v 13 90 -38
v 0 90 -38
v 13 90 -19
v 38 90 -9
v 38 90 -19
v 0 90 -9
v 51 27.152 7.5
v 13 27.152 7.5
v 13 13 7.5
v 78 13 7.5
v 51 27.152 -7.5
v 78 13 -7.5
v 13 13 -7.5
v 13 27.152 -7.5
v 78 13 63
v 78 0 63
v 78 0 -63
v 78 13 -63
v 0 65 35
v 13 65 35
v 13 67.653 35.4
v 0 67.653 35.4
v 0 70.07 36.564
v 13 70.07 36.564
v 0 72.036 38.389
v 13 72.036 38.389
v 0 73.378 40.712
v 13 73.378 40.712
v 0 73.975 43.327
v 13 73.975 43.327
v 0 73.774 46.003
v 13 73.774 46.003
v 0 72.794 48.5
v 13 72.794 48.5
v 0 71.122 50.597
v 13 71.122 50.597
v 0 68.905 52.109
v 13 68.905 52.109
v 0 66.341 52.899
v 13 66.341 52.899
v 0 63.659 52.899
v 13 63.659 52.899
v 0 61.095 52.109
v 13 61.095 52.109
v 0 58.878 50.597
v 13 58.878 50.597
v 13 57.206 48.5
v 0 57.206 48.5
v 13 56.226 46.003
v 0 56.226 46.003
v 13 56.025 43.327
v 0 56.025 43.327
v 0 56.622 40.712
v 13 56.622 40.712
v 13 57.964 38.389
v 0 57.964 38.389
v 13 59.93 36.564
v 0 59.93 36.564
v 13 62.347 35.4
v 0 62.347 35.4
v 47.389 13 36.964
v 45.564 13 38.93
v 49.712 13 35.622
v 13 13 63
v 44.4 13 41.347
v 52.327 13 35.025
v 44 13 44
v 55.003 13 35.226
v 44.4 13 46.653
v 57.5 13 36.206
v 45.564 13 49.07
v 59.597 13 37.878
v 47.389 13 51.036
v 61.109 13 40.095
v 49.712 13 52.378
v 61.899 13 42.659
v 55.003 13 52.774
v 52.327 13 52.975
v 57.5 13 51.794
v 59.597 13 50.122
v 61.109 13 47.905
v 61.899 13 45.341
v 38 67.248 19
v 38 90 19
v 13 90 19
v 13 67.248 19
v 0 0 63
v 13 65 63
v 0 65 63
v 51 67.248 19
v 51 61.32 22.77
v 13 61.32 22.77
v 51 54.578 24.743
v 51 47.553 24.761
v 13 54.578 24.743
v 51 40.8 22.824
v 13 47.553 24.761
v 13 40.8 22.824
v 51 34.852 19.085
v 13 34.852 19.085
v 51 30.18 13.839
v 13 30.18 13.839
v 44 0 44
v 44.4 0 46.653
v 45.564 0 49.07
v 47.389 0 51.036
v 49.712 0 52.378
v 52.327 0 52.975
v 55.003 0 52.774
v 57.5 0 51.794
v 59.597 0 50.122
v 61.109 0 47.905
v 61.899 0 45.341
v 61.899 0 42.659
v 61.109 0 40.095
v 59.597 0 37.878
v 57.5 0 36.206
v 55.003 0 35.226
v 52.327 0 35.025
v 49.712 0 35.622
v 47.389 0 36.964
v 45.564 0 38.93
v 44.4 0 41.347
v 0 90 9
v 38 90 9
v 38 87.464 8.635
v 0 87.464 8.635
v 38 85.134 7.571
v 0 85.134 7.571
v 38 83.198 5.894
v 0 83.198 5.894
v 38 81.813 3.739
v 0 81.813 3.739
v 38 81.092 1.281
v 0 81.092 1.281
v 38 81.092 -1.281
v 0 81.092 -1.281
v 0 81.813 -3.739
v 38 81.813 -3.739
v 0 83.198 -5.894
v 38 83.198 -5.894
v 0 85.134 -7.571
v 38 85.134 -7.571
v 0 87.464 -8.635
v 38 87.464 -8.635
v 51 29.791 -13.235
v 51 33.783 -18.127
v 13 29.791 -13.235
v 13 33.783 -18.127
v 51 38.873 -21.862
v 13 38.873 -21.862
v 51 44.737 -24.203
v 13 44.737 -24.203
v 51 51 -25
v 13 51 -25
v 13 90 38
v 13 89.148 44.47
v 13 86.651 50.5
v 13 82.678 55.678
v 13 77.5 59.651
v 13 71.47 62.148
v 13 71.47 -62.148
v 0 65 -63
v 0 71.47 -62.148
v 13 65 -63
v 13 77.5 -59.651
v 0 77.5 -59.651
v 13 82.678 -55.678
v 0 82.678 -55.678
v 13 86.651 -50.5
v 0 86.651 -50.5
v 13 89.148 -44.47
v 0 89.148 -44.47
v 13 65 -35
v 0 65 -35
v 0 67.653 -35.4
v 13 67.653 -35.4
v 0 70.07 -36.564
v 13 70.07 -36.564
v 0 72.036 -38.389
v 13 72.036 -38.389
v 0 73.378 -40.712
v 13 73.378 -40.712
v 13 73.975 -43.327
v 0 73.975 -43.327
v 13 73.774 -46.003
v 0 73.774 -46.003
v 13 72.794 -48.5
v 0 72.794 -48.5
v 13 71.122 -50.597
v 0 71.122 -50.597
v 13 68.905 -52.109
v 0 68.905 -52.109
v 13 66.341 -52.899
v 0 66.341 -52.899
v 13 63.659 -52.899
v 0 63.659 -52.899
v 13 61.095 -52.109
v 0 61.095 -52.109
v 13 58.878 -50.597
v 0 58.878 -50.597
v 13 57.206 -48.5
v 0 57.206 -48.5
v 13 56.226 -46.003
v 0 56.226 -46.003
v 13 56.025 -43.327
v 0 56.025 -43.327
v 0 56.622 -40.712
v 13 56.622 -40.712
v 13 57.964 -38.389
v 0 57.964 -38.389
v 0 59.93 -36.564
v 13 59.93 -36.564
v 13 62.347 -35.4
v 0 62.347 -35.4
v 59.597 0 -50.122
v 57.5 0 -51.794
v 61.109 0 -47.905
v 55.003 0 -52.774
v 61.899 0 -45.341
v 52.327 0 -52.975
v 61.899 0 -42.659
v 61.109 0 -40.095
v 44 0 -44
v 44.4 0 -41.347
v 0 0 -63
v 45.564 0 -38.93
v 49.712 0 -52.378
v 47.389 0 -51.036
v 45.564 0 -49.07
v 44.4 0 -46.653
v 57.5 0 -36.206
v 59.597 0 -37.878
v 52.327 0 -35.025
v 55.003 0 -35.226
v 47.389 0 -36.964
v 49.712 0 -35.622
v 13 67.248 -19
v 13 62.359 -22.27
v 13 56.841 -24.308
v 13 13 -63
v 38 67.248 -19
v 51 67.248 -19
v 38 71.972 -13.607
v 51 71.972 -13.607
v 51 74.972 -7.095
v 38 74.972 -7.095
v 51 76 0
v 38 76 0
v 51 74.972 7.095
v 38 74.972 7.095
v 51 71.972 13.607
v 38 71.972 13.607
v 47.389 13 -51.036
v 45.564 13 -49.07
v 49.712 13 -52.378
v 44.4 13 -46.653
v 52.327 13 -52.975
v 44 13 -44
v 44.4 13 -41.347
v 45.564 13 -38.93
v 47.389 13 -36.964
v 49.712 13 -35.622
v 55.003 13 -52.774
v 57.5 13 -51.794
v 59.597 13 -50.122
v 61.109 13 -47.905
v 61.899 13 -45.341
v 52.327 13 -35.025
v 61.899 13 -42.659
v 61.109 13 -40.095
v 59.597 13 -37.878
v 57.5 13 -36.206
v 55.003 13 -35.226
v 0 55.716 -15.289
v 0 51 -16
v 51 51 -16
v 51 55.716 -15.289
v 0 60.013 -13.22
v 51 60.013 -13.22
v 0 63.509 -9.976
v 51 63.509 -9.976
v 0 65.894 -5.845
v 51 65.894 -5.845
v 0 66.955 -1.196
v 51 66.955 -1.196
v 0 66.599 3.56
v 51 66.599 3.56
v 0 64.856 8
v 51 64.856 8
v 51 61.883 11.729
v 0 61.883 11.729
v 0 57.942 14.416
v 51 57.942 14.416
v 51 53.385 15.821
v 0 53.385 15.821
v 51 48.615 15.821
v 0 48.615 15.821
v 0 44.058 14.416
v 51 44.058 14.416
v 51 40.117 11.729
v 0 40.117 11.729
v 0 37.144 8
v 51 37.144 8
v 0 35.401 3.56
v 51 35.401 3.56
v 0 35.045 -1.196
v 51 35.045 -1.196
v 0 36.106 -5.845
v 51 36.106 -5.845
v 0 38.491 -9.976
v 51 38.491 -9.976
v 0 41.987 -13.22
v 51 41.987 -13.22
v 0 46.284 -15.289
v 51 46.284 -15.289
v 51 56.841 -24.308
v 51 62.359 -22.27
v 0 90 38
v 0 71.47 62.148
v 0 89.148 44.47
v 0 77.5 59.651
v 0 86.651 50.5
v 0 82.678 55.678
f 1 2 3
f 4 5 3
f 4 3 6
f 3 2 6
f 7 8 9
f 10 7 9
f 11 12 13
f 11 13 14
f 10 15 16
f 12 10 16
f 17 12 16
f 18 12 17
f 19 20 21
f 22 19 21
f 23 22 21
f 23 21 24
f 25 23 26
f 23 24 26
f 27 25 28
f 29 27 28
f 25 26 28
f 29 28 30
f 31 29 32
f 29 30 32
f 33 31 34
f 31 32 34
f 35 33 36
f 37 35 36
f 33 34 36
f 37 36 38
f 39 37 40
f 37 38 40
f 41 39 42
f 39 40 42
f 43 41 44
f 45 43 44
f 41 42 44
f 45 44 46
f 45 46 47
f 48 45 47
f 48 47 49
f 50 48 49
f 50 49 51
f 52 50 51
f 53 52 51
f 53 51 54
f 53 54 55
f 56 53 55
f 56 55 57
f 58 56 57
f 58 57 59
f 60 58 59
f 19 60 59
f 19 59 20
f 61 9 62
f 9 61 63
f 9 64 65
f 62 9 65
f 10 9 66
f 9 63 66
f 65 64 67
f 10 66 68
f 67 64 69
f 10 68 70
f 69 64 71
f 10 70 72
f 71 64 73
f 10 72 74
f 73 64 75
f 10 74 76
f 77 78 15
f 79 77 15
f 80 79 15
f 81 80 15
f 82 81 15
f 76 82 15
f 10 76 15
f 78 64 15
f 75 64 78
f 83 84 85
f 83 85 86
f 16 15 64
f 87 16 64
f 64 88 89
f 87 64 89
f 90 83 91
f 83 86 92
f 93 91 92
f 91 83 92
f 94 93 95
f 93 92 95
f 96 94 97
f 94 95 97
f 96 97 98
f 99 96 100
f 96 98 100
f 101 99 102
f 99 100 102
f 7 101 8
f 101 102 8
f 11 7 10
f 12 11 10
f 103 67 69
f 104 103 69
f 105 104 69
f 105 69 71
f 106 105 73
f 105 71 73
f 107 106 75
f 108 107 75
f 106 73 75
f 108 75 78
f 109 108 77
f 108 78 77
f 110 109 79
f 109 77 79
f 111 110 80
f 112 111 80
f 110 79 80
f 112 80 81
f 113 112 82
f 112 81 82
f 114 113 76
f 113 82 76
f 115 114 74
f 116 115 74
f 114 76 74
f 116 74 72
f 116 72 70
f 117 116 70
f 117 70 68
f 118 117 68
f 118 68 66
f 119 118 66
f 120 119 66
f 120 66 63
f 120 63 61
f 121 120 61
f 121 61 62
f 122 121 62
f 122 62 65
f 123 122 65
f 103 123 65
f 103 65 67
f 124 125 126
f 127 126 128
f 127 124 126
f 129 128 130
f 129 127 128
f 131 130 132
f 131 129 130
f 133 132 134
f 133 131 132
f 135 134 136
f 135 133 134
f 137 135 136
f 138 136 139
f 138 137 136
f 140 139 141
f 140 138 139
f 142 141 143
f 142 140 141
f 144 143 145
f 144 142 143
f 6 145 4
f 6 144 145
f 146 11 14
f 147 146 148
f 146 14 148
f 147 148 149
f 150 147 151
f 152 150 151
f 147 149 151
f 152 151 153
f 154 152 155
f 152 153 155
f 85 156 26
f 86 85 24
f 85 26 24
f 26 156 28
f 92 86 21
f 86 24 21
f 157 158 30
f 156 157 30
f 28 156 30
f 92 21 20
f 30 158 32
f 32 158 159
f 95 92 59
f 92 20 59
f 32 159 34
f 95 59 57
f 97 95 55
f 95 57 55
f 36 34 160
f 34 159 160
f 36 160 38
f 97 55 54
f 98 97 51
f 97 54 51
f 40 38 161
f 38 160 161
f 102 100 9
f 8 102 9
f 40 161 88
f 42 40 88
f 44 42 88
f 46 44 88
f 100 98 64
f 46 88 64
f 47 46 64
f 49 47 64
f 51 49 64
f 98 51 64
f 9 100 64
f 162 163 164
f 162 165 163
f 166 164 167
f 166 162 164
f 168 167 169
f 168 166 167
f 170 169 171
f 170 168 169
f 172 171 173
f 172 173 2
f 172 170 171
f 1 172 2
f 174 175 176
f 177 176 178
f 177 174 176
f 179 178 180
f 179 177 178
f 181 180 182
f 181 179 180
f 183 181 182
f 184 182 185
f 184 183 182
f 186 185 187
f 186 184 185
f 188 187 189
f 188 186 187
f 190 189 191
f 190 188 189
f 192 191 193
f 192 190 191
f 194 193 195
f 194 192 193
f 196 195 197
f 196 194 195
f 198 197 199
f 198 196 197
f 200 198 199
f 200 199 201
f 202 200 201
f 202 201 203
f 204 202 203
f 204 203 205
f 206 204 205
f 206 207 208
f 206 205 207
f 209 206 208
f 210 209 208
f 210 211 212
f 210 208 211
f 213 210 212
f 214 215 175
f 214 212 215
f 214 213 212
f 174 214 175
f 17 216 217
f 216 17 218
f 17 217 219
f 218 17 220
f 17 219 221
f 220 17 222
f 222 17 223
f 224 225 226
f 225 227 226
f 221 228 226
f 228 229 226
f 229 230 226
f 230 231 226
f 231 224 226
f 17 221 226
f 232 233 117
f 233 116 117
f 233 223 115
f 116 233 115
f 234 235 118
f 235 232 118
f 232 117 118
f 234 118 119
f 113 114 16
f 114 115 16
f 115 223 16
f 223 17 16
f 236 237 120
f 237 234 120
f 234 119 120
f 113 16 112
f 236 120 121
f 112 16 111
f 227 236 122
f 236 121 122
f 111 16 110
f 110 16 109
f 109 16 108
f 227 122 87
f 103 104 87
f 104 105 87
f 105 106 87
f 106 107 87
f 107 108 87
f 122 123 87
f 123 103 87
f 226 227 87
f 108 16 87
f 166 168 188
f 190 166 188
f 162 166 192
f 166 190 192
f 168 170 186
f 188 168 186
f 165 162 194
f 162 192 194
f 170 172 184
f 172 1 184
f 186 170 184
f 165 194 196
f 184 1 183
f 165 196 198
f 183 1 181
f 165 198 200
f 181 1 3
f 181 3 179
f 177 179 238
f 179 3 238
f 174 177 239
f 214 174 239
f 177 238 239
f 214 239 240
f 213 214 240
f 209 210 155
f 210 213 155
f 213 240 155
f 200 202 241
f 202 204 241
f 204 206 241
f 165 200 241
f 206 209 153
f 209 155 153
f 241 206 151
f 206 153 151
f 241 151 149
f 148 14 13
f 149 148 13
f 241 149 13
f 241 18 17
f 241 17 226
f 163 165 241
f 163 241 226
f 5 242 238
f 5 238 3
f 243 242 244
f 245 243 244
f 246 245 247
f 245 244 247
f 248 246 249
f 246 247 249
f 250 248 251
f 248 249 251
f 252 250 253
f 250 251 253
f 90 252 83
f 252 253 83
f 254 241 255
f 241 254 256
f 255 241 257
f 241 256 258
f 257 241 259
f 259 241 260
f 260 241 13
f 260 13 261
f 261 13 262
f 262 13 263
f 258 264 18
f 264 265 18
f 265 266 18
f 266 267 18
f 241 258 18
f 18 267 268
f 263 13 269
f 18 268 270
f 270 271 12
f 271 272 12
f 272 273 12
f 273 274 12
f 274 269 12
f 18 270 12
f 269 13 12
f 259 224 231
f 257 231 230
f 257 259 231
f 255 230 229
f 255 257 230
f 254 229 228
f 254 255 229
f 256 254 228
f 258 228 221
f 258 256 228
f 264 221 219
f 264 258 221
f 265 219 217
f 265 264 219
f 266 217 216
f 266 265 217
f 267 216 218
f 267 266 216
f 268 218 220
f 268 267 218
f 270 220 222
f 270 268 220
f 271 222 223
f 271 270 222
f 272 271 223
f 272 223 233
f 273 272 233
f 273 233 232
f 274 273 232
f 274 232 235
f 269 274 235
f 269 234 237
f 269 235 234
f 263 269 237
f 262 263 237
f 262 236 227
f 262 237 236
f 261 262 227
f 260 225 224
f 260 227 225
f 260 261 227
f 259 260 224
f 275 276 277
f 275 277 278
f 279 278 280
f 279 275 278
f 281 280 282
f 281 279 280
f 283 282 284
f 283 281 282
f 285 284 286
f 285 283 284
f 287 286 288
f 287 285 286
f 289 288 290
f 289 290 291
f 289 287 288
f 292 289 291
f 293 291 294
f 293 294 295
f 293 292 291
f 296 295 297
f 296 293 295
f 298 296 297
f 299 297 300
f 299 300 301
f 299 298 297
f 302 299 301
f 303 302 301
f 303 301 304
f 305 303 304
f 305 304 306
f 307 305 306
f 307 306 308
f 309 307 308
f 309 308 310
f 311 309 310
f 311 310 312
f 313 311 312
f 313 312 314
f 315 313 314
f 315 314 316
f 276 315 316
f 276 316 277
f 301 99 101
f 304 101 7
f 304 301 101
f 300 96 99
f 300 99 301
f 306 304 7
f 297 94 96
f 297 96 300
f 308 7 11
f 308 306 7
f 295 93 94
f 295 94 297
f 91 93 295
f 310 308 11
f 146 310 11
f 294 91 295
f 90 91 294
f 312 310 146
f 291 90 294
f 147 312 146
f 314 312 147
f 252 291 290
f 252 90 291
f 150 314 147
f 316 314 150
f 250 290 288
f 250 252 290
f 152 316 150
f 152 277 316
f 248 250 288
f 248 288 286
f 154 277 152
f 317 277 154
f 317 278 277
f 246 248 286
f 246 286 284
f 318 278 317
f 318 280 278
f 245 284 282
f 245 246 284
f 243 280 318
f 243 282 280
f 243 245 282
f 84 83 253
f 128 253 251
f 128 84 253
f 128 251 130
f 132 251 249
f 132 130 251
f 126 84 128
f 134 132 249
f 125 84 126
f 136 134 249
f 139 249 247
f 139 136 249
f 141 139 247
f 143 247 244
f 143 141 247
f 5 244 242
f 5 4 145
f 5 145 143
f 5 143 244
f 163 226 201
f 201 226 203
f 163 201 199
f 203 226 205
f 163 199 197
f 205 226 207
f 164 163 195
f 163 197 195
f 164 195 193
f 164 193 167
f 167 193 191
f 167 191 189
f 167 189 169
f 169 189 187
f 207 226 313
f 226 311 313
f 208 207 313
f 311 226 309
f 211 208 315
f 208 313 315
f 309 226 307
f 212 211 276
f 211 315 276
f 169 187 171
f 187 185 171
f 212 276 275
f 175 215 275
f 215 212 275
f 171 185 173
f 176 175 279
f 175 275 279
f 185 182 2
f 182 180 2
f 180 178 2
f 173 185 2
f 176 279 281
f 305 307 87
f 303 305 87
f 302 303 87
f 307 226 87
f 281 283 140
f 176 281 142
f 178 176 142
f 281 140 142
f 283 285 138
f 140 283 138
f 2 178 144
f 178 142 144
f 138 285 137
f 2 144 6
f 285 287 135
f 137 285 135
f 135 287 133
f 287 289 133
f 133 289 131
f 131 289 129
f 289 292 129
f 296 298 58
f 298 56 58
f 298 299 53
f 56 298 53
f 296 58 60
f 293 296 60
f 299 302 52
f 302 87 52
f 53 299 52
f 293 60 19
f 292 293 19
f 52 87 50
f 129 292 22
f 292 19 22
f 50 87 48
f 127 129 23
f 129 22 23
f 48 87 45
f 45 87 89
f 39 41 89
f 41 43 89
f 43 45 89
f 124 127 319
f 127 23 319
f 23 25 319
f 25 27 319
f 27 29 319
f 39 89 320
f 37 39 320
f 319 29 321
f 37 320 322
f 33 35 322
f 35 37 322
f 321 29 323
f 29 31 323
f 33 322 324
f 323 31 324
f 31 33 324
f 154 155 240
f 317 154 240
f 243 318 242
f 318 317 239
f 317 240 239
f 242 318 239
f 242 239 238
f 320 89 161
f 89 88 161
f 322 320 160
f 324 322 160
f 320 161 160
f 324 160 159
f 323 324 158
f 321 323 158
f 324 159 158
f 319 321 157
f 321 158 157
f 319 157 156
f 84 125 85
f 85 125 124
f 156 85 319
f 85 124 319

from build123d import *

# Parameters (mm, degrees)
BOSS_EXTRUDE1_DEPTH = 63
SKETCH2_R           = 16
BOSS_EXTRUDE2_DEPTH = 38
BOSS_EXTRUDE3_DEPTH = 25
CUT_EXTRUDE1_START  = -38
CUT_EXTRUDE1_DEPTH  = 38
CUT_EXTRUDE2_START  = -38
SKETCH2_5_R         = 16
CUT_EXTRUDE2_DEPTH  = 38
BOSS_EXTRUDE4_DEPTH = 65
SKETCH5_R           = 9
CUT_EXTRUDE4_DEPTH  = 38
SKETCH6_R           = 9
CUT_EXTRUDE5_DEPTH  = 38
FILLET1_R           = 25
CUT_EXTRUDE6_DEPTH  = 38


with BuildPart() as part:
    # Sketch1 → Boss-Extrude1 (new, symmetric)
    with BuildSketch(Plane.XY):
        Polygon((0, 0), (0, 90), (13, 90), (13, 13), (78, 13), (78, 0), align=None)
    extrude(amount=BOSS_EXTRUDE1_DEPTH, both=True)

    # Sketch2 → Boss-Extrude2 (add)
    with BuildSketch(Plane(origin=(13, 0, 0), x_dir=(0, 0, -1), z_dir=(1, 0, 0))):
        with BuildLine():
            ThreePointArc((19, 67.248076809), (0, 76), (-19, 67.248076809))
            ThreePointArc((-19, 67.248076809), (-24.031145784, 44.107683096), (-7.5, 27.151519965))
            Line((-7.5, 27.151519965), (7.5, 27.151519965))
            ThreePointArc((7.5, 27.151519965), (20.155644371, 36.209800542), (25, 51))
            ThreePointArc((25, 51), (23.452078799, 59.660254038), (19, 67.248076809))
        make_face()
        with Locations((0, 51)):
            Circle(SKETCH2_R, mode=Mode.SUBTRACT)
    extrude(amount=BOSS_EXTRUDE2_DEPTH)

    # Sketch2<3> → Boss-Extrude3 (add)
    with BuildSketch(Plane(origin=(13, 0, 0), x_dir=(0, 0, -1), z_dir=(1, 0, 0))):
        with BuildLine():
            Line((-9, 90), (-19, 90))
            Line((-19, 90), (-19, 67.248076809))
            ThreePointArc((-19, 67.248076809), (0, 76), (19, 67.248076809))
            Line((19, 67.248076809), (19, 90))
            Line((19, 90), (9, 90))
            ThreePointArc((9, 90), (0, 81), (-9, 90))
        make_face()
    extrude(amount=BOSS_EXTRUDE3_DEPTH)

    # Sketch2<4> → Cut-Extrude1 (cut)
    with BuildSketch(Plane(origin=(13, 0, 0), x_dir=(0, 0, -1), z_dir=(1, 0, 0)).offset(CUT_EXTRUDE1_START)):
        with BuildLine():
            Line((9, 90), (-9, 90))
            ThreePointArc((-9, 90), (0, 81), (9, 90))
        make_face()
    extrude(amount=CUT_EXTRUDE1_DEPTH, mode=Mode.SUBTRACT)

    # Sketch2<5> → Cut-Extrude2 (cut)
    with BuildSketch(Plane(origin=(13, 0, 0), x_dir=(0, 0, -1), z_dir=(1, 0, 0)).offset(CUT_EXTRUDE2_START)):
        with Locations((0, 51)):
            Circle(SKETCH2_5_R)
    extrude(amount=CUT_EXTRUDE2_DEPTH, mode=Mode.SUBTRACT)

    # Sketch2<6> → Boss-Extrude4 (add)
    with BuildSketch(Plane(origin=(13, 0, 0), x_dir=(0, 0, -1), z_dir=(1, 0, 0))):
        with BuildLine():
            ThreePointArc((7.5, 27.151519965), (0, 26), (-7.5, 27.151519965))
            Line((-7.5, 27.151519965), (-7.5, 13))
            Line((-7.5, 13), (7.5, 13))
            Line((7.5, 13), (7.5, 27.151519965))
        make_face()
        with BuildLine():
            Line((7.5, 27.151519965), (-7.5, 27.151519965))
            ThreePointArc((-7.5, 27.151519965), (0, 26), (7.5, 27.151519965))
        make_face()
    extrude(amount=BOSS_EXTRUDE4_DEPTH)

    # Sketch5 → Cut-Extrude4 (cut)
    with BuildSketch(Plane(origin=(13, 0, 0), x_dir=(0, 0, -1), z_dir=(1, 0, 0))):
        with Locations((-44, 65)):
            Circle(SKETCH5_R)
    cut_extrude4 = extrude(amount=-CUT_EXTRUDE4_DEPTH, mode=Mode.SUBTRACT)

    # Mirror1: Cut-Extrude4 across plane
    add(cut_extrude4.mirror(Plane.XY), mode=Mode.SUBTRACT)

    # Sketch6 → Cut-Extrude5 (cut)
    with BuildSketch(Plane(origin=(0, 13, 0), x_dir=(1, 0, 0), z_dir=(0, 1, 0))):
        with Locations(Location((53, -44, 0), (0, 0, 180))):
            Circle(SKETCH6_R)
    cut_extrude5 = extrude(amount=-CUT_EXTRUDE5_DEPTH, mode=Mode.SUBTRACT)

    # Mirror2: Cut-Extrude5 across plane
    add(cut_extrude5.mirror(Plane.XY), mode=Mode.SUBTRACT)

    # Fillet1
    fillet1_edges = [part.edges().sort_by_distance(p)[0] for p in [
        (6.5, 90, 63),
        (6.5, 90, -63),
    ]]
    fillet(fillet1_edges, radius=FILLET1_R)

    # Sketch7 → Cut-Extrude6 (cut)
    with BuildSketch(Plane.XY.offset(7.5)):
        Polygon((51, 27.151519965), (78, 13), (78, 27.151519965), align=None)
    extrude(amount=-CUT_EXTRUDE6_DEPTH, mode=Mode.SUBTRACT)


solid = part.part
